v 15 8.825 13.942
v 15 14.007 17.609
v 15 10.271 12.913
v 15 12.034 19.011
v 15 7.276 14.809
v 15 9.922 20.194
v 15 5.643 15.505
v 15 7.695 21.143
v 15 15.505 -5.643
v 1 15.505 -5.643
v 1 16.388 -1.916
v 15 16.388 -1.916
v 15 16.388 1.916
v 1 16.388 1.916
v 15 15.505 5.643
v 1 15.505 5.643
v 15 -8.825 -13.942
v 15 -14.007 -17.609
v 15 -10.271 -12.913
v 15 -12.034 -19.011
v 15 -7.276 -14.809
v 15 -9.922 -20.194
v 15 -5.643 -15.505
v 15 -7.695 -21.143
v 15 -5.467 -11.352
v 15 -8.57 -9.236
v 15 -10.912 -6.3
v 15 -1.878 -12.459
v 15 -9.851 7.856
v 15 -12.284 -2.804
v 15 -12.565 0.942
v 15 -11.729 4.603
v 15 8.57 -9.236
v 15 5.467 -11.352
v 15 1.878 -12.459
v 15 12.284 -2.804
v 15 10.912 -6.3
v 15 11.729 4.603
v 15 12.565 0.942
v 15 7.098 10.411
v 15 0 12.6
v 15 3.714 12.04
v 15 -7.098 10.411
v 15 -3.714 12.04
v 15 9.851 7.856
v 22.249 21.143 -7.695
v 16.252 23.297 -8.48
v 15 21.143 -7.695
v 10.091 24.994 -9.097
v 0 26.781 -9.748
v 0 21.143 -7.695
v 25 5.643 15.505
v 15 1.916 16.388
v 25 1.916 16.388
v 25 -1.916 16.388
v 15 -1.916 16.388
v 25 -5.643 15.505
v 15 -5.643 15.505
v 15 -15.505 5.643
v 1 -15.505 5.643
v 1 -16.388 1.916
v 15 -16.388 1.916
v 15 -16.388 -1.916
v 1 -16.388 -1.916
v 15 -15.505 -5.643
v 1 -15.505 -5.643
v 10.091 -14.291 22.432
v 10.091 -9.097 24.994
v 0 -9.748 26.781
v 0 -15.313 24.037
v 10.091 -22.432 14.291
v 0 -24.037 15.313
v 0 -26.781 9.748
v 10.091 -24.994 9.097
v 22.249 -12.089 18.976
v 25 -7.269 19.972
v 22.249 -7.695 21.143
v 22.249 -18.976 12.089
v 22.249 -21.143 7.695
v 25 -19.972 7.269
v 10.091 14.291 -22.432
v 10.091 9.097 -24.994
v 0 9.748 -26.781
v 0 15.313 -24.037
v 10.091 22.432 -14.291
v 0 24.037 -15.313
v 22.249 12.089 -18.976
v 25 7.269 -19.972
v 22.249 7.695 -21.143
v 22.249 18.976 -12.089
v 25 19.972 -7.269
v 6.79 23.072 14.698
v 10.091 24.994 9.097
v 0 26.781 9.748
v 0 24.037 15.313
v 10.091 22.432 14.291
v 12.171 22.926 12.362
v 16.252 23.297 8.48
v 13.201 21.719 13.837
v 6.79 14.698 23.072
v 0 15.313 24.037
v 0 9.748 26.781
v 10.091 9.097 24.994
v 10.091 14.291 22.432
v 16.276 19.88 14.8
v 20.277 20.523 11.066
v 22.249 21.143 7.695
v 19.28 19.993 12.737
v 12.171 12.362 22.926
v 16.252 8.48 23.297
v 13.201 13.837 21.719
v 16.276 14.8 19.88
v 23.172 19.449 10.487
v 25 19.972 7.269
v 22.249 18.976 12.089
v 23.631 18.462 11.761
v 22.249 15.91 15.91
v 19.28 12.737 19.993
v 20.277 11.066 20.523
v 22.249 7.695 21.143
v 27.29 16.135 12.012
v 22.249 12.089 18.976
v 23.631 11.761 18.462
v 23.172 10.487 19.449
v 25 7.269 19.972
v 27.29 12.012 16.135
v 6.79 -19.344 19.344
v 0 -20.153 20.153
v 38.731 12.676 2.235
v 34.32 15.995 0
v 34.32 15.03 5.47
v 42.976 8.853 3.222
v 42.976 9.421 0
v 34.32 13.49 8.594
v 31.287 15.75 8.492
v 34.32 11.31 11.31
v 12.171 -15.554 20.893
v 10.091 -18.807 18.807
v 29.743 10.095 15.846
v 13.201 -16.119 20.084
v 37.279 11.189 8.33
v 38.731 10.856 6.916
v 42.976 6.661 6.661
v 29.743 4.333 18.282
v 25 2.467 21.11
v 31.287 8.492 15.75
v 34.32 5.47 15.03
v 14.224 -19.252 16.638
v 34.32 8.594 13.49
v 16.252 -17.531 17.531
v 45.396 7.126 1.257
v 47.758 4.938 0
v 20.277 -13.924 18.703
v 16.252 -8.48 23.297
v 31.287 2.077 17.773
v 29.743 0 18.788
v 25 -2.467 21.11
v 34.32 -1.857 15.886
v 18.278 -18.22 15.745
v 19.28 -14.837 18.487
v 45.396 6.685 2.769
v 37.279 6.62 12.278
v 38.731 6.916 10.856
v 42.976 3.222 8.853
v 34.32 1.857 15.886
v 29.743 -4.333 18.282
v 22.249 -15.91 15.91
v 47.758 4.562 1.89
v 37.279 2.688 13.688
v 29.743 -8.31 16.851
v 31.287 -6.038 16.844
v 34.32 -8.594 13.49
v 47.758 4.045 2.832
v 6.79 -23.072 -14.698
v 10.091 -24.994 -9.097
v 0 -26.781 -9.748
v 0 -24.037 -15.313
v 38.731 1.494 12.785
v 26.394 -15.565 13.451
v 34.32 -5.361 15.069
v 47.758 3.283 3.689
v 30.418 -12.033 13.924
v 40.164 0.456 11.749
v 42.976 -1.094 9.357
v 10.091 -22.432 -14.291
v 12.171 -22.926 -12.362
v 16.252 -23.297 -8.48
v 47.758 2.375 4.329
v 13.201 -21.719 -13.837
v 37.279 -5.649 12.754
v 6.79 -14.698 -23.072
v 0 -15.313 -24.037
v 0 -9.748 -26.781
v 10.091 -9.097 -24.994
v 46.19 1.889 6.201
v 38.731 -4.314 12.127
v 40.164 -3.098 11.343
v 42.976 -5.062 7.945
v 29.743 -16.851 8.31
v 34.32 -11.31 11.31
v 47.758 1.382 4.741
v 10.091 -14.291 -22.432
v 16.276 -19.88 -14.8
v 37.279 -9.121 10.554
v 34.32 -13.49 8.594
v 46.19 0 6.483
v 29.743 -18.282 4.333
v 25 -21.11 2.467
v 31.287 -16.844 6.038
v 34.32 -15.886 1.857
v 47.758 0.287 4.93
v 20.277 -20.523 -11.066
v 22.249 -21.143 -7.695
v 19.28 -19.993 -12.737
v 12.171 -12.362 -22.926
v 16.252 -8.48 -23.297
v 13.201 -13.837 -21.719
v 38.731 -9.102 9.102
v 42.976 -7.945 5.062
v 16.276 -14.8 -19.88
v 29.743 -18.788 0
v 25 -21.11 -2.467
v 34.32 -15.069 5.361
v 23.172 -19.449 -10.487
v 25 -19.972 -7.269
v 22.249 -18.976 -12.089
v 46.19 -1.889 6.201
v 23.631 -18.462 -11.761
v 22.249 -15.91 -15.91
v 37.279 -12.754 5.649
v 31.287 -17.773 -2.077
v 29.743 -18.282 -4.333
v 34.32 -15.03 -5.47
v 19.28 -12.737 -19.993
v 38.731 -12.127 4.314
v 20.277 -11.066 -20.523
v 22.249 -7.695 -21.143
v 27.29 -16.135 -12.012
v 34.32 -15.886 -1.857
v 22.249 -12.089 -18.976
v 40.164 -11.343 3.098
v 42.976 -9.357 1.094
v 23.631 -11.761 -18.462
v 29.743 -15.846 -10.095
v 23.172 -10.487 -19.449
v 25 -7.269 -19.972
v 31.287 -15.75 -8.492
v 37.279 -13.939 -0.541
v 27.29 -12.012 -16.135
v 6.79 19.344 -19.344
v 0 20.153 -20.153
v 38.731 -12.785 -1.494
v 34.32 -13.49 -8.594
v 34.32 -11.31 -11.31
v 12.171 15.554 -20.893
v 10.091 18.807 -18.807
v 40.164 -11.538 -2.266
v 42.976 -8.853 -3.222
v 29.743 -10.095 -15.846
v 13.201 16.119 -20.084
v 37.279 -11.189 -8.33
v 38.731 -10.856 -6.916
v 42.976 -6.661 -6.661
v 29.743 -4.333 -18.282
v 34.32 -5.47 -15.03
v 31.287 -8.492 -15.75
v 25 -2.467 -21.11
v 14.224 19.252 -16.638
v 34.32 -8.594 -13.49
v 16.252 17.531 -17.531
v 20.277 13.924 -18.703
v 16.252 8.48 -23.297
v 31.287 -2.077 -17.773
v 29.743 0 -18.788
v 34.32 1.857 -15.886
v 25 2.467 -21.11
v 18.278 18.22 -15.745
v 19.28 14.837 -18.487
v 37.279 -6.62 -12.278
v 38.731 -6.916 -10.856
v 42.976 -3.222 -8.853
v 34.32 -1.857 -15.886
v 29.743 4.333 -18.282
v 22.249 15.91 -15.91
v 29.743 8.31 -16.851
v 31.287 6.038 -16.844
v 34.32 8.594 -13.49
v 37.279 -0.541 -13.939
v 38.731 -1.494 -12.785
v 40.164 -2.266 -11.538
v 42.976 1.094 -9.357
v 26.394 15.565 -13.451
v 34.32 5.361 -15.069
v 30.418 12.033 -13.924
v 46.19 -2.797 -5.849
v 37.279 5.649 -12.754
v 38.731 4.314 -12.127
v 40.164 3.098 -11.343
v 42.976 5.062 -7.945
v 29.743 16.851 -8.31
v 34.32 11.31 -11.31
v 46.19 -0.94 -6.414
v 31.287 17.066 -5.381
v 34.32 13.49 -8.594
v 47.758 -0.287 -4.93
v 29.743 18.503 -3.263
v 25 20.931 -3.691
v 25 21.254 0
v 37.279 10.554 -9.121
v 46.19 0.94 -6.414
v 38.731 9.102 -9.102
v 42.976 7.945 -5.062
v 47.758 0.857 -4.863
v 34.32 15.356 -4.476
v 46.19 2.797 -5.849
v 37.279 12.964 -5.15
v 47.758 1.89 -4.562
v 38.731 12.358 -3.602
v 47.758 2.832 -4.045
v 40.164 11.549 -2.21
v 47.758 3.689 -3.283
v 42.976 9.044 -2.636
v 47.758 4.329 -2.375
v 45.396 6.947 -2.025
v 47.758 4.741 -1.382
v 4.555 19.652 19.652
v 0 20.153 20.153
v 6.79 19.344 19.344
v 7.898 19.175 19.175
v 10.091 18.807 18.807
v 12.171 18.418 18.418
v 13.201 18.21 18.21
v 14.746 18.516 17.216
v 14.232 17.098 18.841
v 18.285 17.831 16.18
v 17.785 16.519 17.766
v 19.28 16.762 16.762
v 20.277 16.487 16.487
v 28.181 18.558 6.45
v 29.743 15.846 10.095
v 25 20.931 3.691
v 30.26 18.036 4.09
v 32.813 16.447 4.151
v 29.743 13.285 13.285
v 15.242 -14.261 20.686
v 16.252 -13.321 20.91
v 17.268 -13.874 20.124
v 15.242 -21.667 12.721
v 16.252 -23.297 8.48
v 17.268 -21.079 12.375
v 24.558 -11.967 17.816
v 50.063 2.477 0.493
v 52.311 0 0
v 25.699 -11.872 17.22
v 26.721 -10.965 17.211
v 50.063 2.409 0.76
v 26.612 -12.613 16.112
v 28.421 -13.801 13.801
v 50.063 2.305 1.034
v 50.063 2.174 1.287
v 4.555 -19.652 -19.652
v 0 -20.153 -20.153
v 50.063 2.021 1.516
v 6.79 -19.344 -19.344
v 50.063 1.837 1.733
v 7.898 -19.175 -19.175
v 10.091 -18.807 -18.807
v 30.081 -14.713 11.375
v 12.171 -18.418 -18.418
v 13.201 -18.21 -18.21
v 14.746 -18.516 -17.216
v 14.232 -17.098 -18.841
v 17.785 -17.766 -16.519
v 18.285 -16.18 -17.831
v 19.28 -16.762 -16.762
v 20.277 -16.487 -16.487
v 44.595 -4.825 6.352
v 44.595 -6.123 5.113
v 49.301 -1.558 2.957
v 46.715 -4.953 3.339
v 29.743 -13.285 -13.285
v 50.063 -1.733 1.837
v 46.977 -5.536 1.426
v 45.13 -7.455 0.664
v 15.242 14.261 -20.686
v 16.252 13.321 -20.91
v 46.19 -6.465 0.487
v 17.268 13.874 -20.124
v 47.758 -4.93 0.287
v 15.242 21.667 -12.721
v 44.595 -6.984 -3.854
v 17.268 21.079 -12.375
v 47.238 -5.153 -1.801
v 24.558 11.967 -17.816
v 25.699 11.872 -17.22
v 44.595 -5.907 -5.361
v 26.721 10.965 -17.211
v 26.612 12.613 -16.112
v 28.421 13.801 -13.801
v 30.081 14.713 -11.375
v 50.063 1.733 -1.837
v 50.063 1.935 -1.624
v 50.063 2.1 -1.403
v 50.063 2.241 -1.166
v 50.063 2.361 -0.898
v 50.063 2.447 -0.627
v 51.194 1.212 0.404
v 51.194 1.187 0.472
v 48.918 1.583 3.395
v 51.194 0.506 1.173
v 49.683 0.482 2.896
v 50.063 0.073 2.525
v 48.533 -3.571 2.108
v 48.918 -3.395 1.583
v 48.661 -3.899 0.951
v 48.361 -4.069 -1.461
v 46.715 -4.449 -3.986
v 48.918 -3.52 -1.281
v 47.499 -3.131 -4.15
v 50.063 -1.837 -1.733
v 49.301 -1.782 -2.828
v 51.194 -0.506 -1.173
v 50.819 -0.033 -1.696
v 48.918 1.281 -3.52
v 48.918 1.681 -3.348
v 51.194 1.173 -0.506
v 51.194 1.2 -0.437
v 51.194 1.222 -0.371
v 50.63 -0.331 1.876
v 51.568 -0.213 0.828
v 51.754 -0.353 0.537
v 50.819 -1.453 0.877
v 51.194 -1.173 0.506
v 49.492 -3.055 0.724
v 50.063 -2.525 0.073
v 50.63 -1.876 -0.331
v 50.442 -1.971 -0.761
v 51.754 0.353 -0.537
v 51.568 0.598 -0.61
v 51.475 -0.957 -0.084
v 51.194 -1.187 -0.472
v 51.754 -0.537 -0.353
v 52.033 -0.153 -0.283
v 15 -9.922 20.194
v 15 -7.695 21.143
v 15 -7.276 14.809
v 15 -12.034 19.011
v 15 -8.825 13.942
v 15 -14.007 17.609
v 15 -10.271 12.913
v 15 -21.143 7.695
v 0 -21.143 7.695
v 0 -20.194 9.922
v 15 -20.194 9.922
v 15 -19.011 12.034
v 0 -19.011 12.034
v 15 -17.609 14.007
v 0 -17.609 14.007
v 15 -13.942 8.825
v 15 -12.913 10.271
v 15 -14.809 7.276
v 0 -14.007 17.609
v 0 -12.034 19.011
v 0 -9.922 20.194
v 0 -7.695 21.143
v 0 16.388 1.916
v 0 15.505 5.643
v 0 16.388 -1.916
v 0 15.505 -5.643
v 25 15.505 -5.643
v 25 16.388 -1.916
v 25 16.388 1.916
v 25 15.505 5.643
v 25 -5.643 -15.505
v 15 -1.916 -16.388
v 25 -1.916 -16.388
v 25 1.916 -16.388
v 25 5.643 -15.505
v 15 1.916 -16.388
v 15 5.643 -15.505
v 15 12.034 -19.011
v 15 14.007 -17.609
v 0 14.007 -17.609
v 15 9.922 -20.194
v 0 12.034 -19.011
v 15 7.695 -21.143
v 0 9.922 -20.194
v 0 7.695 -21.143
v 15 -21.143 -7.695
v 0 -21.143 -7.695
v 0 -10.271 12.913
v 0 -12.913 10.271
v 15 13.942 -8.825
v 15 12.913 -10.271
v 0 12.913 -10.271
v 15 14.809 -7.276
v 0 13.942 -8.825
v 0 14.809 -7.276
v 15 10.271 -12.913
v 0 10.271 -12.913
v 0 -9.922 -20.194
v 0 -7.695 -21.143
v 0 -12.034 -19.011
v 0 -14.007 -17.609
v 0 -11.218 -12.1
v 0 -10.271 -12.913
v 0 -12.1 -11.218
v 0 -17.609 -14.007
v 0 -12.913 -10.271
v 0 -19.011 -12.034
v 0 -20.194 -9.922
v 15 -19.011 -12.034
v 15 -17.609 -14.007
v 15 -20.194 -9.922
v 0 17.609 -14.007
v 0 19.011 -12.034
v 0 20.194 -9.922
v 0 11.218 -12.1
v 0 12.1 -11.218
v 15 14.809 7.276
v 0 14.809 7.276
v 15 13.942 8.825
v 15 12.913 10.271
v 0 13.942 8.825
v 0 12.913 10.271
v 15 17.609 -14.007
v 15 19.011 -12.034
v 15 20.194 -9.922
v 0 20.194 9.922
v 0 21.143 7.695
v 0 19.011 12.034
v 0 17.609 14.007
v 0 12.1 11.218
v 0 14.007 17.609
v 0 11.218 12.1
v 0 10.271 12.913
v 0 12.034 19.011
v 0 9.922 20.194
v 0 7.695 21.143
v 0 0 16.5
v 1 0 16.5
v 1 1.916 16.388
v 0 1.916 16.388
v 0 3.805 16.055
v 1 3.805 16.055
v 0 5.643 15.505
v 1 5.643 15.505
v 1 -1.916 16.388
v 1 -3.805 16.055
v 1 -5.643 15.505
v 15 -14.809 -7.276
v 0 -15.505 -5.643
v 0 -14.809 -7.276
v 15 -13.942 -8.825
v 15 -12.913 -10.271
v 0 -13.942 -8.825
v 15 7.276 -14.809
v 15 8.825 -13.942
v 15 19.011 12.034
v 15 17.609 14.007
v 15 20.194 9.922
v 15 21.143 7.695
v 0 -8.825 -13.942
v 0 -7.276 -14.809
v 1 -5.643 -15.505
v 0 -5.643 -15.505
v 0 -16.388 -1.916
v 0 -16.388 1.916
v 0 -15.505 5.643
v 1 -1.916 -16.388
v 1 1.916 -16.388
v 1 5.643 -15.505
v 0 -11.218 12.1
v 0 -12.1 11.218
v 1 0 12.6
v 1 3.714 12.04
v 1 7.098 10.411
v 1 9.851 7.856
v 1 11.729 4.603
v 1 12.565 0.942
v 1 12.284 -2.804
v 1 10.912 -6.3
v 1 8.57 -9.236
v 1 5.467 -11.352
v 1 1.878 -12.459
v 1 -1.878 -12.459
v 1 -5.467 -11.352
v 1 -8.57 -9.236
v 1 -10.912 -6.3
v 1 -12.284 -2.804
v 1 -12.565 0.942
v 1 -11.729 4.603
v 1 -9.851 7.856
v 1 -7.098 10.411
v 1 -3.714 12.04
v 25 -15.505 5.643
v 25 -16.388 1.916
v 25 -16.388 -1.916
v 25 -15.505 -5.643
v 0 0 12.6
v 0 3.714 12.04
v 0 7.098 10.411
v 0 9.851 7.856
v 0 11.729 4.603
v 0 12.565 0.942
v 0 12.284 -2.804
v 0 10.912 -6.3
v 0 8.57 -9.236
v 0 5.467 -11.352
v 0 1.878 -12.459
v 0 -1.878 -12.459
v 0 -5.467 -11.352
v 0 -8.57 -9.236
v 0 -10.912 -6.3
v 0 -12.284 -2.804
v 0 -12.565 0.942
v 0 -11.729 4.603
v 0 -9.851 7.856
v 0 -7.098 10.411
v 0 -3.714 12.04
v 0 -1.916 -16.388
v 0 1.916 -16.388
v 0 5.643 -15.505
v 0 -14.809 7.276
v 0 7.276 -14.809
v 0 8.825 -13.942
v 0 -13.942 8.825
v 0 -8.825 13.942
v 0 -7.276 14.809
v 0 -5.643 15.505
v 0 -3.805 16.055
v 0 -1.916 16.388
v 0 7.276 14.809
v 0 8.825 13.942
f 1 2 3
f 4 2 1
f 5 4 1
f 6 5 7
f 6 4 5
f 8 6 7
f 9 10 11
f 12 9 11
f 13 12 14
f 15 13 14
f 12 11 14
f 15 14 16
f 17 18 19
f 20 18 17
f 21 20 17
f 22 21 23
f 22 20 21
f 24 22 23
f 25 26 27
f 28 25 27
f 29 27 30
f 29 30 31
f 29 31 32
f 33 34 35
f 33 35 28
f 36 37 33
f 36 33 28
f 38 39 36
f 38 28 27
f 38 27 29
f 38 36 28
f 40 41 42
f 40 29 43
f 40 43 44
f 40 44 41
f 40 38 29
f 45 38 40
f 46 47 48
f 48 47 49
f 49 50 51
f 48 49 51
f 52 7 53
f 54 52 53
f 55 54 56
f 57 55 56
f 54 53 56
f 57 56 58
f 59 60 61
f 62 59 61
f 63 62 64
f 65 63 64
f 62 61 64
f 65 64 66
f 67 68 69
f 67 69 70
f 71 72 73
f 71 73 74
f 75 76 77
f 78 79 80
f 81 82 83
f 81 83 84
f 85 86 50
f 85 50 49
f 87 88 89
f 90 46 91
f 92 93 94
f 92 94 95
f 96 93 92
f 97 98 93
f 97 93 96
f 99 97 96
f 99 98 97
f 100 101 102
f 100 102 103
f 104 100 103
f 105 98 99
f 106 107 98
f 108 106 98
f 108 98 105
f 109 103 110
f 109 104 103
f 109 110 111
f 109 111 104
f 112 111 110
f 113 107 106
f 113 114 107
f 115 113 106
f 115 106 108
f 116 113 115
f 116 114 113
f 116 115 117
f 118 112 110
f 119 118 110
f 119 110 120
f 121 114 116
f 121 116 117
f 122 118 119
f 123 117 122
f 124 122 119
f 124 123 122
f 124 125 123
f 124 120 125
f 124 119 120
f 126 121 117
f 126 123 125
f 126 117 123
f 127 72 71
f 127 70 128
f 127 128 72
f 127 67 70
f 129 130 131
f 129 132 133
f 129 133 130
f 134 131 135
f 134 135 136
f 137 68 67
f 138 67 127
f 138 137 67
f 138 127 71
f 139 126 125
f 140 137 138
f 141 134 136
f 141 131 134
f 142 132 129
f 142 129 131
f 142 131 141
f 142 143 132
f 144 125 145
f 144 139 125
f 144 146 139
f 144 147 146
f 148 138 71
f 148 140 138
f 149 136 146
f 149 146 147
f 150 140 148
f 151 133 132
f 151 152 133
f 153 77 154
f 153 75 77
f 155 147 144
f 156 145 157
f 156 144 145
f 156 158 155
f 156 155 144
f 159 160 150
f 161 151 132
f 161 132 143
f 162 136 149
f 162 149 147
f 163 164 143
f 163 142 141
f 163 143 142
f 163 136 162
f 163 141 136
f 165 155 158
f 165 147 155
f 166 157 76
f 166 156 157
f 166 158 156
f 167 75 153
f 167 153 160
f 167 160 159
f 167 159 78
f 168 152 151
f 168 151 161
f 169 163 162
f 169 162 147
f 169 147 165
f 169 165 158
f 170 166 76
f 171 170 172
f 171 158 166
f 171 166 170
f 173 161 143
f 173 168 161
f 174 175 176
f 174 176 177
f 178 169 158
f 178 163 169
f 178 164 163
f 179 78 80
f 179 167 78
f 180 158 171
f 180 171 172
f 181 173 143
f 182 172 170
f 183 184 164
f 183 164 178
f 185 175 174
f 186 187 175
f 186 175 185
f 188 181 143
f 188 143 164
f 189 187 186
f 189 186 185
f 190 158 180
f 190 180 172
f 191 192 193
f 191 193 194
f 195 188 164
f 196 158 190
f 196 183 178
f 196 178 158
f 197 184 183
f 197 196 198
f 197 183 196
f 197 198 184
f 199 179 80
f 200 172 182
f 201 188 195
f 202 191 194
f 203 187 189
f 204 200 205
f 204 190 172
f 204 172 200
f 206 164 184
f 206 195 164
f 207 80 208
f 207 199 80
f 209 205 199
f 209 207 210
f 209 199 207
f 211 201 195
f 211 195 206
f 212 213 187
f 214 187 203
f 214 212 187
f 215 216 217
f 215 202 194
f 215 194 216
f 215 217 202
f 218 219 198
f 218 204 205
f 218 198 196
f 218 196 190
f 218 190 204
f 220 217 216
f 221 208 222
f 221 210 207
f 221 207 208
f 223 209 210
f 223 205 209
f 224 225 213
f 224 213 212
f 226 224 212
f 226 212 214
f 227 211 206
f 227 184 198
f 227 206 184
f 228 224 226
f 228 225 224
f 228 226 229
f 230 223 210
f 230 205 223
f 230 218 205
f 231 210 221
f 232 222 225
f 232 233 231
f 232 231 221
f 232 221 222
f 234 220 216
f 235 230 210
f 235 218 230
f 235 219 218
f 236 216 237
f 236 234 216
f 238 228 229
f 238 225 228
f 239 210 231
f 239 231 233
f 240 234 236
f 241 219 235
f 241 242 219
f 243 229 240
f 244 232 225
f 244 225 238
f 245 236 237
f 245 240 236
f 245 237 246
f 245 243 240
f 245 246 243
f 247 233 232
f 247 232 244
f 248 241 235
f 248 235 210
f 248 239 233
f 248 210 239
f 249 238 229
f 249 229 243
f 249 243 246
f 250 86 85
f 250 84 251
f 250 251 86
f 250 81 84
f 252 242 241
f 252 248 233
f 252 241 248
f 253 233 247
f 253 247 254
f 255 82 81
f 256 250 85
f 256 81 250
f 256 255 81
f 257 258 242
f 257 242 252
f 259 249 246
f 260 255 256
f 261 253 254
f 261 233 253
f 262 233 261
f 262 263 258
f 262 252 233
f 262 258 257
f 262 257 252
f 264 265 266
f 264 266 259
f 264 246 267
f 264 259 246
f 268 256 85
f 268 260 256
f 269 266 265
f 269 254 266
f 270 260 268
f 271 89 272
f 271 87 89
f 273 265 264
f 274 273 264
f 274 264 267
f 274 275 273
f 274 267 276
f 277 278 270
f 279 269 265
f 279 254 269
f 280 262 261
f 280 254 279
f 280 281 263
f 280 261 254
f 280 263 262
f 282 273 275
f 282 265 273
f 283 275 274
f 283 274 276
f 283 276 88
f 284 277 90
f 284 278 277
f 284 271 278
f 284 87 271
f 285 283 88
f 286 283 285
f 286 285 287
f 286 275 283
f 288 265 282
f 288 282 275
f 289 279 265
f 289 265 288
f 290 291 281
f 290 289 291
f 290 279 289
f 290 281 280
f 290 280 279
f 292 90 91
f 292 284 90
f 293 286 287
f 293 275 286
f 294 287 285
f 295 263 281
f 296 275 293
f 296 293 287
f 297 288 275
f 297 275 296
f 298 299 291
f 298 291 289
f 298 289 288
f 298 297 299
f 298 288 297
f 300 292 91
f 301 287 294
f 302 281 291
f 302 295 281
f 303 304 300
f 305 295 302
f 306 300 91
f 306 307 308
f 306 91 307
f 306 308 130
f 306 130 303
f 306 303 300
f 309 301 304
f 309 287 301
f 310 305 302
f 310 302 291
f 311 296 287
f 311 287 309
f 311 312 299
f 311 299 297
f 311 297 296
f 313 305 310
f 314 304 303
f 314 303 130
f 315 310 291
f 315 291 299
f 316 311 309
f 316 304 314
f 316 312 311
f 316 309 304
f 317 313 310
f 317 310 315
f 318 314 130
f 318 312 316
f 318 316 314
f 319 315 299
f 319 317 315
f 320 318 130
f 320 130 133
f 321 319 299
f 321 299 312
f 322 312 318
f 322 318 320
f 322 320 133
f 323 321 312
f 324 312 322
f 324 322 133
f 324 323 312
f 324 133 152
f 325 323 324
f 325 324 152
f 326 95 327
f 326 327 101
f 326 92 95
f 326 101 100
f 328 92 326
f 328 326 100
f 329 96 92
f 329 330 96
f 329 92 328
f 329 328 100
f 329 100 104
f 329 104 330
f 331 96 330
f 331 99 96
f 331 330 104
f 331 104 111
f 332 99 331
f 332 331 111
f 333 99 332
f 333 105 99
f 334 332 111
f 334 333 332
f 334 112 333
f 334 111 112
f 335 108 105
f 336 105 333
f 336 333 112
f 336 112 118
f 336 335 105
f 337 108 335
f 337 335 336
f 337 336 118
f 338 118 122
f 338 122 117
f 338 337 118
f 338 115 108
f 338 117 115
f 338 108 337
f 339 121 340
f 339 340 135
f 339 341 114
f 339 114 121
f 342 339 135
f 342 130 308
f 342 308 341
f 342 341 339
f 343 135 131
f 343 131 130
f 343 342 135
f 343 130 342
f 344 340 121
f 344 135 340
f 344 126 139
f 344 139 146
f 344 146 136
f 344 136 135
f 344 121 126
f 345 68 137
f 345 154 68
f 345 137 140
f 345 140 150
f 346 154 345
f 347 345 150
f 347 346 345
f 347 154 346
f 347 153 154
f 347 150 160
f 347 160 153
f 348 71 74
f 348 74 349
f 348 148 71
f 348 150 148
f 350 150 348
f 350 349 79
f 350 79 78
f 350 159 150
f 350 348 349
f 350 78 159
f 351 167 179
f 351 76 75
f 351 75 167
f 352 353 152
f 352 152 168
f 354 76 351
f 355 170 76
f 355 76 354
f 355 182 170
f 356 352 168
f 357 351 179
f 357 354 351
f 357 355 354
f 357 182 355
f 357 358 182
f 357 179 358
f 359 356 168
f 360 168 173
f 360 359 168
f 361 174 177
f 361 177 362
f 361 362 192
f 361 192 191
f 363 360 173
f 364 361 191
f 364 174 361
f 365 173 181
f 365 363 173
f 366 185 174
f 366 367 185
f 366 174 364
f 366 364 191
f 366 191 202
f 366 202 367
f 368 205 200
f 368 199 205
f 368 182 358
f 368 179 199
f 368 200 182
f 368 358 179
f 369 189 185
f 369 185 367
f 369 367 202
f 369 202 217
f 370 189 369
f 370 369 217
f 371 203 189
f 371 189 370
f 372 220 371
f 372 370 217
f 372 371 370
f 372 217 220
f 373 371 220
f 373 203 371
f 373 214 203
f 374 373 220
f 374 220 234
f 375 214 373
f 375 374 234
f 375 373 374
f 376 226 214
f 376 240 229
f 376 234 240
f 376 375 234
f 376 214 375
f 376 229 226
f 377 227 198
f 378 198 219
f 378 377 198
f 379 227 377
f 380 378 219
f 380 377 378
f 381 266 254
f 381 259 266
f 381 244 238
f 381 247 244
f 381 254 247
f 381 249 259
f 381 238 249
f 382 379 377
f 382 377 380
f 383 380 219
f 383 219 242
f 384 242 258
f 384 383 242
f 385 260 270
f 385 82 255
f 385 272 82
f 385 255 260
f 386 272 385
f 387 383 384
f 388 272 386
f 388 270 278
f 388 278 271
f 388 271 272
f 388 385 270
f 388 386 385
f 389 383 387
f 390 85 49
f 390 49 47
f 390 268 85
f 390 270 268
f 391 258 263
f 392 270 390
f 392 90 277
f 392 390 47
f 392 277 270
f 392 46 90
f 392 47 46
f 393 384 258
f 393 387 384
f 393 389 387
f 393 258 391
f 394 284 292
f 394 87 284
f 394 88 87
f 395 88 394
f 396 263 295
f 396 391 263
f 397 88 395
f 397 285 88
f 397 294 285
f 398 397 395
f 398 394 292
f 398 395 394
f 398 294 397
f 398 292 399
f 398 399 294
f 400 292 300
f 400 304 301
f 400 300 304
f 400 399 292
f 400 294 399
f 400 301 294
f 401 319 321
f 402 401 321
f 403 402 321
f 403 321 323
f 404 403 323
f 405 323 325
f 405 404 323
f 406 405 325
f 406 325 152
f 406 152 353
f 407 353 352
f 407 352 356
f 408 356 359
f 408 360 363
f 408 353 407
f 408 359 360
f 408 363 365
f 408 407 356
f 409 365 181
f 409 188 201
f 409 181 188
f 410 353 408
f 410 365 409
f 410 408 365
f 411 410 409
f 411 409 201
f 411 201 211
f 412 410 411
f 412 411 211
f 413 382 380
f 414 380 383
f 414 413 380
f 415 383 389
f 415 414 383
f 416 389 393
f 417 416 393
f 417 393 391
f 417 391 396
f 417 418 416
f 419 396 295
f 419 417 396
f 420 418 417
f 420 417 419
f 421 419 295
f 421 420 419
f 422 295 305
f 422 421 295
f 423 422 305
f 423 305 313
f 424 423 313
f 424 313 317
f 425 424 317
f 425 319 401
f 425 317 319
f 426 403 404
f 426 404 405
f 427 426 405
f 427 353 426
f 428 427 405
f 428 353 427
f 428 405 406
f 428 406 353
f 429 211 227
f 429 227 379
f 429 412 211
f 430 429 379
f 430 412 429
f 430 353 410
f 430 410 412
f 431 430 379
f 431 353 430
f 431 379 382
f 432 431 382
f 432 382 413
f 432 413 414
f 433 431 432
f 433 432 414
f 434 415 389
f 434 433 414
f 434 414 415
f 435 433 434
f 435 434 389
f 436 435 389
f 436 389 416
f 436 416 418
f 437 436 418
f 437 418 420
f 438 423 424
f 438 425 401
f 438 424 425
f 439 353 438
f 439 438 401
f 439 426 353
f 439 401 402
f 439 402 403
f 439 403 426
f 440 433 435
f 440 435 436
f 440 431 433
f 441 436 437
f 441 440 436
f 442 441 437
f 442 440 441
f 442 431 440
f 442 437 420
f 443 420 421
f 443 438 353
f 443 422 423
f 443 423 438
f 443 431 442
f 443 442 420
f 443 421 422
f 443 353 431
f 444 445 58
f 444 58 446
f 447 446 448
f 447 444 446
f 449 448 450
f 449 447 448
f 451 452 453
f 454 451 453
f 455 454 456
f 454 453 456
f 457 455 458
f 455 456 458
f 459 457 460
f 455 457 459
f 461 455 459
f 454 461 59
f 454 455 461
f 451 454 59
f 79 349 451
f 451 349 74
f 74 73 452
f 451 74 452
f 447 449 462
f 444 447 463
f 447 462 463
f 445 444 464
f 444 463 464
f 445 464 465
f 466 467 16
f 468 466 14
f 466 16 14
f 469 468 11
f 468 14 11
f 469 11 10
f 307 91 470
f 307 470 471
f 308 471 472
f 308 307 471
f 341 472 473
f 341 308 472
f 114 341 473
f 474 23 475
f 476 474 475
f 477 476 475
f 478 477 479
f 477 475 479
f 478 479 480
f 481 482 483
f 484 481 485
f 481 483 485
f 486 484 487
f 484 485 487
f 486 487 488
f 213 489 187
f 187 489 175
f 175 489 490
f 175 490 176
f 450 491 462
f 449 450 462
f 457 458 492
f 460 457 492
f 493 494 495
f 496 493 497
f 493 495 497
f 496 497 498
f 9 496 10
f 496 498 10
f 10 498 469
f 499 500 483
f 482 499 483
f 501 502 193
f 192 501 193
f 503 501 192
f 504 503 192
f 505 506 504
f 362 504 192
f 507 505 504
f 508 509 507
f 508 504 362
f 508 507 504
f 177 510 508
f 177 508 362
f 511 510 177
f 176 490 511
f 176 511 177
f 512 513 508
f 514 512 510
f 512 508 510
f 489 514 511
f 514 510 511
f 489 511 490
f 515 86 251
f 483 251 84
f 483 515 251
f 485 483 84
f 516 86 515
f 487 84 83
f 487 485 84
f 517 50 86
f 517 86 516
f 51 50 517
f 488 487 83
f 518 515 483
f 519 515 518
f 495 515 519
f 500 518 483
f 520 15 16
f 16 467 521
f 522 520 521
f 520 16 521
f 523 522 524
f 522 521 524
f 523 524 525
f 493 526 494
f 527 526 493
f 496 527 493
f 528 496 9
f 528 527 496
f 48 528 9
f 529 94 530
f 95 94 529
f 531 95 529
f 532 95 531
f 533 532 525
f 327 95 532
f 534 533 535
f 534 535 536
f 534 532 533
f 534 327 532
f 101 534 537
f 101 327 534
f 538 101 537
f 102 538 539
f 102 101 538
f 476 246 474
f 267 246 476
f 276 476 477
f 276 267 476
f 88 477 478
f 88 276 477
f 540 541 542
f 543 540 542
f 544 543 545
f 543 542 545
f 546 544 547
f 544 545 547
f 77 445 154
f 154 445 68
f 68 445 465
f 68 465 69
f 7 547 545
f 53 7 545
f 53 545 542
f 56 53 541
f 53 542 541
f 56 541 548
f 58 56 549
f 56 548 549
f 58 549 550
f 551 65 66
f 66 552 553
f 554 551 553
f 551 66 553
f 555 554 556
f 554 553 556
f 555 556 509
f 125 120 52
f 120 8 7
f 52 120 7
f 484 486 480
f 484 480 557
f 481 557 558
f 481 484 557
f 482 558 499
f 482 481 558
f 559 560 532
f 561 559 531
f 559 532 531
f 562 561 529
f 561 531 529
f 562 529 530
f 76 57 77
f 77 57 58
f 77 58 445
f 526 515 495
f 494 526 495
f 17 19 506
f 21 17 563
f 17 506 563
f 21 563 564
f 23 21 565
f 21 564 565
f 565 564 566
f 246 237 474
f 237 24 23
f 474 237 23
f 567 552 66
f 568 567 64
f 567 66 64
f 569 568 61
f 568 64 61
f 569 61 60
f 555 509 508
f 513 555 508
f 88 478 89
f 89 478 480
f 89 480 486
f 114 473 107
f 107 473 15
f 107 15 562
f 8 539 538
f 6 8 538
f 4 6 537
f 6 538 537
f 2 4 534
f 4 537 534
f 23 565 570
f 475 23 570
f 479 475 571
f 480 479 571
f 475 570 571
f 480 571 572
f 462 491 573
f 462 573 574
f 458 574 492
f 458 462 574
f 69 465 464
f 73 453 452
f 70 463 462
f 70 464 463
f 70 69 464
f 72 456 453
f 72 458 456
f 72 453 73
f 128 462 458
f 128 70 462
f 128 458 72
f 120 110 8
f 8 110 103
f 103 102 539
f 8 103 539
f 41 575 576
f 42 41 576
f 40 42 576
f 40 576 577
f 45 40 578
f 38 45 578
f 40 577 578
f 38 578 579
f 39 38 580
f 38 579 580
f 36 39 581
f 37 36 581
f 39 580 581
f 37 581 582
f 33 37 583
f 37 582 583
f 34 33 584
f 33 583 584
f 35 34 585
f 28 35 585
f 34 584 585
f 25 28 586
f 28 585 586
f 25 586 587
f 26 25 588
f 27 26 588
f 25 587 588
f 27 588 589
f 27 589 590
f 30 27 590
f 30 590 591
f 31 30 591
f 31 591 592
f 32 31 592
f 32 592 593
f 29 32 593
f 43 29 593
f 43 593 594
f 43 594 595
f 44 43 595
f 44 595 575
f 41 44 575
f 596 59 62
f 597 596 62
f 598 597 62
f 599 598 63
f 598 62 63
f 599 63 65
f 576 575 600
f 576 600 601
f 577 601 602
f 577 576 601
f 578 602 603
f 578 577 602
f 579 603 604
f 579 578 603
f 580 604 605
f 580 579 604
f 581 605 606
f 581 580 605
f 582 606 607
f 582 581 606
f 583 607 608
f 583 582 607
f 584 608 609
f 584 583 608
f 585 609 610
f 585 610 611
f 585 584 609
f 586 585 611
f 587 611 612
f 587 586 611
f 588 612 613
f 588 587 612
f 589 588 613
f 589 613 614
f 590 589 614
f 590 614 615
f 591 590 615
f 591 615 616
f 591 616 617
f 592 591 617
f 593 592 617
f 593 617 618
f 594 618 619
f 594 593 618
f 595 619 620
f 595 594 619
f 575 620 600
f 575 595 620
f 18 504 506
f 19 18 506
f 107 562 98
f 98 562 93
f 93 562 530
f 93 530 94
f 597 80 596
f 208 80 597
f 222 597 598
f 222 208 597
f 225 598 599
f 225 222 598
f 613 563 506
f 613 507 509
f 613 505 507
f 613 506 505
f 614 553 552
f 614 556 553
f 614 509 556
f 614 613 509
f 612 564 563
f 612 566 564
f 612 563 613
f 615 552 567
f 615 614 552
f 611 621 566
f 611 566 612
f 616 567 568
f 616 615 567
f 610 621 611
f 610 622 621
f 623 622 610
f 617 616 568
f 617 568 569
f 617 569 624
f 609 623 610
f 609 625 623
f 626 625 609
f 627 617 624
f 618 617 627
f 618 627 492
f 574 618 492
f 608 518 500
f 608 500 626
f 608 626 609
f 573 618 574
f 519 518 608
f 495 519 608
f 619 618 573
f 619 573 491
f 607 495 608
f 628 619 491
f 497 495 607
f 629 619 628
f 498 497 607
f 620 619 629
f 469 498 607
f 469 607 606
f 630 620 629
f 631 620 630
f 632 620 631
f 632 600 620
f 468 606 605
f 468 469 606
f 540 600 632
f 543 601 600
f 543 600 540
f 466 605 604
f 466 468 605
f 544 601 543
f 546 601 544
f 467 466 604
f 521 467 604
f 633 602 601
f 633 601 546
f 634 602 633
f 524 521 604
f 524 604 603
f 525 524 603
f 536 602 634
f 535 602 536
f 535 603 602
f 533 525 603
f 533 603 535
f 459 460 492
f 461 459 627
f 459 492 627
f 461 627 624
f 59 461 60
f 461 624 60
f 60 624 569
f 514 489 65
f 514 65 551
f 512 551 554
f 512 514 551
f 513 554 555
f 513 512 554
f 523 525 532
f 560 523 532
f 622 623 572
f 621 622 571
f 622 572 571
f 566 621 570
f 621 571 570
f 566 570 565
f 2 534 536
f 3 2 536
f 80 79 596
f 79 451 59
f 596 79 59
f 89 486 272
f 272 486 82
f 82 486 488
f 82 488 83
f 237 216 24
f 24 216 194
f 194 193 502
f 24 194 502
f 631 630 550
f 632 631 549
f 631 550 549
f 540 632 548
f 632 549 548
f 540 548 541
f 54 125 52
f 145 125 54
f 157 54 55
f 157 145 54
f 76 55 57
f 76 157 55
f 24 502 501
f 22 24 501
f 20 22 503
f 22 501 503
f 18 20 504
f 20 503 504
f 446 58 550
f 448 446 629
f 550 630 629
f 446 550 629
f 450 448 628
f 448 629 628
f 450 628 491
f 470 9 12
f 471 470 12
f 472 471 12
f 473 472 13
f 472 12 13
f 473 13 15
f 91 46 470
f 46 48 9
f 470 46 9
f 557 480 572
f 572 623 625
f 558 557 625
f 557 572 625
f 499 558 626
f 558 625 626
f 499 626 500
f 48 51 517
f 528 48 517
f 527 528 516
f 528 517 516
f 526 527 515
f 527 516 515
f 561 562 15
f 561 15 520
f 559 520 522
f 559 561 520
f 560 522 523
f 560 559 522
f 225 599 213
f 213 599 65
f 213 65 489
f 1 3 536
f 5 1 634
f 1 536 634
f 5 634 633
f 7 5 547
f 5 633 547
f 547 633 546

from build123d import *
from build123d.topology import SkipClean

# Parameters (mm, degrees)
SKETCH_7_R               = 12.6
CUT_EXTRUDE_1_DEPTH      = 15
SKETCH_8_R               = 16.5
CUT_EXTRUDE_2_DEPTH      = 1
CUT_EXTRUDE_3_DEPTH      = 25
PATTERN_CIRCULAR_1_COUNT = 4
SKETCH_12_R              = 16.5
SKETCH_12_R_2            = 12.6
EXTRUDE_1_DEPTH          = 1
CUT_EXTRUDE_4_DEPTH      = 15
PATTERN_CIRCULAR_2_COUNT = 4


with BuildPart() as part:
    # Эскиз2 → Повернуть1 (revolve)
    with BuildSketch(Plane.XY):
        with BuildLine():
            Line((0, 0), (0, 28.5))
            add(Edge.make_bspline(
                [(0, 28.5), (31.309007967, 24.448027272), (52.310724818, 0)],
                knots=[0, 0, 0, 1, 1, 1], degree=2))
            Line((52.310724818, 0), (28.5, 0))
            Line((28.5, 0), (0, 0))
        make_face()
    revolve(axis=Axis((-1000, 0, 0), (1, 0, 0)))

    # Эскиз7 → Вырез-Вытянуть1 (cut)
    with BuildSketch(Plane.ZY):
        Circle(SKETCH_7_R)
    extrude(amount=-CUT_EXTRUDE_1_DEPTH, mode=Mode.SUBTRACT)

    # Эскиз8 → Вырез-Вытянуть2 (cut)
    with BuildSketch(Plane.ZY):
        Circle(SKETCH_8_R)
    extrude(amount=-CUT_EXTRUDE_2_DEPTH, mode=Mode.SUBTRACT)

    # Эскиз11 → Вырез-Вытянуть3 (cut)
    with BuildSketch(Plane.ZY):
        with BuildLine():
            Line((-9.747574085, 26.781239692), (-7.695453225, 21.143083968))
            Line((-7.695453225, 21.143083968), (-5.643332365, 15.504928243))
            ThreePointArc((-5.643332365, 15.504928243), (0, 16.5), (5.643332365, 15.504928243))
            Line((5.643332365, 15.504928243), (7.695453225, 21.143083968))
            Line((7.695453225, 21.143083968), (9.747574085, 26.781239692))
            ThreePointArc((9.747574085, 26.781239692), (0, 28.5), (-9.747574085, 26.781239692))
        make_face()
    cut_extrude_3 = extrude(amount=-CUT_EXTRUDE_3_DEPTH, mode=Mode.SUBTRACT)

    # Круговой массив1: Вырез-Вытянуть3 ×4 about axis
    pattern_circular_1_axis = Axis((1, 0, 0), (-1, 0, 0))
    for i in range(1, PATTERN_CIRCULAR_1_COUNT):
        add(cut_extrude_3.rotate(pattern_circular_1_axis, i * 360 / PATTERN_CIRCULAR_1_COUNT), mode=Mode.SUBTRACT)

    # Эскиз12 → Бобышка-Вытянуть1 (add)
    with SkipClean():  # the faces are left unmerged after this step: merging them gives an invalid solid
        with BuildSketch(Plane.ZY.offset(-1)):
            Circle(SKETCH_12_R)
            Circle(SKETCH_12_R_2, mode=Mode.SUBTRACT)
        extrude(amount=EXTRUDE_1_DEPTH)

    # Эскиз13 → Вырез-Вытянуть4 (cut)
    with SkipClean():  # the faces are left unmerged after this step: merging them gives an invalid solid
        with BuildSketch(Plane.ZY):
            with BuildLine():
                Line((-14.006579324, 17.608683529), (-10.271491505, 12.913034588))
                ThreePointArc((-10.271491505, 12.913034588), (0, 16.5), (10.271491505, 12.913034588))
                Line((10.271491505, 12.913034588), (14.006579324, 17.608683529))
                ThreePointArc((14.006579324, 17.608683529), (0, 22.5), (-14.006579324, 17.608683529))
            make_face()
        cut_extrude_4 = extrude(amount=-CUT_EXTRUDE_4_DEPTH, mode=Mode.SUBTRACT)

    # Круговой массив2: Вырез-Вытянуть4 ×4 about axis
    with SkipClean():  # the faces are left unmerged after this step: merging them gives an invalid solid
        pattern_circular_2_axis = Axis((0, 0, 0), (-1, 0, 0))
        for i in range(1, PATTERN_CIRCULAR_2_COUNT):
            add(cut_extrude_4.rotate(pattern_circular_2_axis, i * 360 / PATTERN_CIRCULAR_2_COUNT), mode=Mode.SUBTRACT)


solid = part.part
